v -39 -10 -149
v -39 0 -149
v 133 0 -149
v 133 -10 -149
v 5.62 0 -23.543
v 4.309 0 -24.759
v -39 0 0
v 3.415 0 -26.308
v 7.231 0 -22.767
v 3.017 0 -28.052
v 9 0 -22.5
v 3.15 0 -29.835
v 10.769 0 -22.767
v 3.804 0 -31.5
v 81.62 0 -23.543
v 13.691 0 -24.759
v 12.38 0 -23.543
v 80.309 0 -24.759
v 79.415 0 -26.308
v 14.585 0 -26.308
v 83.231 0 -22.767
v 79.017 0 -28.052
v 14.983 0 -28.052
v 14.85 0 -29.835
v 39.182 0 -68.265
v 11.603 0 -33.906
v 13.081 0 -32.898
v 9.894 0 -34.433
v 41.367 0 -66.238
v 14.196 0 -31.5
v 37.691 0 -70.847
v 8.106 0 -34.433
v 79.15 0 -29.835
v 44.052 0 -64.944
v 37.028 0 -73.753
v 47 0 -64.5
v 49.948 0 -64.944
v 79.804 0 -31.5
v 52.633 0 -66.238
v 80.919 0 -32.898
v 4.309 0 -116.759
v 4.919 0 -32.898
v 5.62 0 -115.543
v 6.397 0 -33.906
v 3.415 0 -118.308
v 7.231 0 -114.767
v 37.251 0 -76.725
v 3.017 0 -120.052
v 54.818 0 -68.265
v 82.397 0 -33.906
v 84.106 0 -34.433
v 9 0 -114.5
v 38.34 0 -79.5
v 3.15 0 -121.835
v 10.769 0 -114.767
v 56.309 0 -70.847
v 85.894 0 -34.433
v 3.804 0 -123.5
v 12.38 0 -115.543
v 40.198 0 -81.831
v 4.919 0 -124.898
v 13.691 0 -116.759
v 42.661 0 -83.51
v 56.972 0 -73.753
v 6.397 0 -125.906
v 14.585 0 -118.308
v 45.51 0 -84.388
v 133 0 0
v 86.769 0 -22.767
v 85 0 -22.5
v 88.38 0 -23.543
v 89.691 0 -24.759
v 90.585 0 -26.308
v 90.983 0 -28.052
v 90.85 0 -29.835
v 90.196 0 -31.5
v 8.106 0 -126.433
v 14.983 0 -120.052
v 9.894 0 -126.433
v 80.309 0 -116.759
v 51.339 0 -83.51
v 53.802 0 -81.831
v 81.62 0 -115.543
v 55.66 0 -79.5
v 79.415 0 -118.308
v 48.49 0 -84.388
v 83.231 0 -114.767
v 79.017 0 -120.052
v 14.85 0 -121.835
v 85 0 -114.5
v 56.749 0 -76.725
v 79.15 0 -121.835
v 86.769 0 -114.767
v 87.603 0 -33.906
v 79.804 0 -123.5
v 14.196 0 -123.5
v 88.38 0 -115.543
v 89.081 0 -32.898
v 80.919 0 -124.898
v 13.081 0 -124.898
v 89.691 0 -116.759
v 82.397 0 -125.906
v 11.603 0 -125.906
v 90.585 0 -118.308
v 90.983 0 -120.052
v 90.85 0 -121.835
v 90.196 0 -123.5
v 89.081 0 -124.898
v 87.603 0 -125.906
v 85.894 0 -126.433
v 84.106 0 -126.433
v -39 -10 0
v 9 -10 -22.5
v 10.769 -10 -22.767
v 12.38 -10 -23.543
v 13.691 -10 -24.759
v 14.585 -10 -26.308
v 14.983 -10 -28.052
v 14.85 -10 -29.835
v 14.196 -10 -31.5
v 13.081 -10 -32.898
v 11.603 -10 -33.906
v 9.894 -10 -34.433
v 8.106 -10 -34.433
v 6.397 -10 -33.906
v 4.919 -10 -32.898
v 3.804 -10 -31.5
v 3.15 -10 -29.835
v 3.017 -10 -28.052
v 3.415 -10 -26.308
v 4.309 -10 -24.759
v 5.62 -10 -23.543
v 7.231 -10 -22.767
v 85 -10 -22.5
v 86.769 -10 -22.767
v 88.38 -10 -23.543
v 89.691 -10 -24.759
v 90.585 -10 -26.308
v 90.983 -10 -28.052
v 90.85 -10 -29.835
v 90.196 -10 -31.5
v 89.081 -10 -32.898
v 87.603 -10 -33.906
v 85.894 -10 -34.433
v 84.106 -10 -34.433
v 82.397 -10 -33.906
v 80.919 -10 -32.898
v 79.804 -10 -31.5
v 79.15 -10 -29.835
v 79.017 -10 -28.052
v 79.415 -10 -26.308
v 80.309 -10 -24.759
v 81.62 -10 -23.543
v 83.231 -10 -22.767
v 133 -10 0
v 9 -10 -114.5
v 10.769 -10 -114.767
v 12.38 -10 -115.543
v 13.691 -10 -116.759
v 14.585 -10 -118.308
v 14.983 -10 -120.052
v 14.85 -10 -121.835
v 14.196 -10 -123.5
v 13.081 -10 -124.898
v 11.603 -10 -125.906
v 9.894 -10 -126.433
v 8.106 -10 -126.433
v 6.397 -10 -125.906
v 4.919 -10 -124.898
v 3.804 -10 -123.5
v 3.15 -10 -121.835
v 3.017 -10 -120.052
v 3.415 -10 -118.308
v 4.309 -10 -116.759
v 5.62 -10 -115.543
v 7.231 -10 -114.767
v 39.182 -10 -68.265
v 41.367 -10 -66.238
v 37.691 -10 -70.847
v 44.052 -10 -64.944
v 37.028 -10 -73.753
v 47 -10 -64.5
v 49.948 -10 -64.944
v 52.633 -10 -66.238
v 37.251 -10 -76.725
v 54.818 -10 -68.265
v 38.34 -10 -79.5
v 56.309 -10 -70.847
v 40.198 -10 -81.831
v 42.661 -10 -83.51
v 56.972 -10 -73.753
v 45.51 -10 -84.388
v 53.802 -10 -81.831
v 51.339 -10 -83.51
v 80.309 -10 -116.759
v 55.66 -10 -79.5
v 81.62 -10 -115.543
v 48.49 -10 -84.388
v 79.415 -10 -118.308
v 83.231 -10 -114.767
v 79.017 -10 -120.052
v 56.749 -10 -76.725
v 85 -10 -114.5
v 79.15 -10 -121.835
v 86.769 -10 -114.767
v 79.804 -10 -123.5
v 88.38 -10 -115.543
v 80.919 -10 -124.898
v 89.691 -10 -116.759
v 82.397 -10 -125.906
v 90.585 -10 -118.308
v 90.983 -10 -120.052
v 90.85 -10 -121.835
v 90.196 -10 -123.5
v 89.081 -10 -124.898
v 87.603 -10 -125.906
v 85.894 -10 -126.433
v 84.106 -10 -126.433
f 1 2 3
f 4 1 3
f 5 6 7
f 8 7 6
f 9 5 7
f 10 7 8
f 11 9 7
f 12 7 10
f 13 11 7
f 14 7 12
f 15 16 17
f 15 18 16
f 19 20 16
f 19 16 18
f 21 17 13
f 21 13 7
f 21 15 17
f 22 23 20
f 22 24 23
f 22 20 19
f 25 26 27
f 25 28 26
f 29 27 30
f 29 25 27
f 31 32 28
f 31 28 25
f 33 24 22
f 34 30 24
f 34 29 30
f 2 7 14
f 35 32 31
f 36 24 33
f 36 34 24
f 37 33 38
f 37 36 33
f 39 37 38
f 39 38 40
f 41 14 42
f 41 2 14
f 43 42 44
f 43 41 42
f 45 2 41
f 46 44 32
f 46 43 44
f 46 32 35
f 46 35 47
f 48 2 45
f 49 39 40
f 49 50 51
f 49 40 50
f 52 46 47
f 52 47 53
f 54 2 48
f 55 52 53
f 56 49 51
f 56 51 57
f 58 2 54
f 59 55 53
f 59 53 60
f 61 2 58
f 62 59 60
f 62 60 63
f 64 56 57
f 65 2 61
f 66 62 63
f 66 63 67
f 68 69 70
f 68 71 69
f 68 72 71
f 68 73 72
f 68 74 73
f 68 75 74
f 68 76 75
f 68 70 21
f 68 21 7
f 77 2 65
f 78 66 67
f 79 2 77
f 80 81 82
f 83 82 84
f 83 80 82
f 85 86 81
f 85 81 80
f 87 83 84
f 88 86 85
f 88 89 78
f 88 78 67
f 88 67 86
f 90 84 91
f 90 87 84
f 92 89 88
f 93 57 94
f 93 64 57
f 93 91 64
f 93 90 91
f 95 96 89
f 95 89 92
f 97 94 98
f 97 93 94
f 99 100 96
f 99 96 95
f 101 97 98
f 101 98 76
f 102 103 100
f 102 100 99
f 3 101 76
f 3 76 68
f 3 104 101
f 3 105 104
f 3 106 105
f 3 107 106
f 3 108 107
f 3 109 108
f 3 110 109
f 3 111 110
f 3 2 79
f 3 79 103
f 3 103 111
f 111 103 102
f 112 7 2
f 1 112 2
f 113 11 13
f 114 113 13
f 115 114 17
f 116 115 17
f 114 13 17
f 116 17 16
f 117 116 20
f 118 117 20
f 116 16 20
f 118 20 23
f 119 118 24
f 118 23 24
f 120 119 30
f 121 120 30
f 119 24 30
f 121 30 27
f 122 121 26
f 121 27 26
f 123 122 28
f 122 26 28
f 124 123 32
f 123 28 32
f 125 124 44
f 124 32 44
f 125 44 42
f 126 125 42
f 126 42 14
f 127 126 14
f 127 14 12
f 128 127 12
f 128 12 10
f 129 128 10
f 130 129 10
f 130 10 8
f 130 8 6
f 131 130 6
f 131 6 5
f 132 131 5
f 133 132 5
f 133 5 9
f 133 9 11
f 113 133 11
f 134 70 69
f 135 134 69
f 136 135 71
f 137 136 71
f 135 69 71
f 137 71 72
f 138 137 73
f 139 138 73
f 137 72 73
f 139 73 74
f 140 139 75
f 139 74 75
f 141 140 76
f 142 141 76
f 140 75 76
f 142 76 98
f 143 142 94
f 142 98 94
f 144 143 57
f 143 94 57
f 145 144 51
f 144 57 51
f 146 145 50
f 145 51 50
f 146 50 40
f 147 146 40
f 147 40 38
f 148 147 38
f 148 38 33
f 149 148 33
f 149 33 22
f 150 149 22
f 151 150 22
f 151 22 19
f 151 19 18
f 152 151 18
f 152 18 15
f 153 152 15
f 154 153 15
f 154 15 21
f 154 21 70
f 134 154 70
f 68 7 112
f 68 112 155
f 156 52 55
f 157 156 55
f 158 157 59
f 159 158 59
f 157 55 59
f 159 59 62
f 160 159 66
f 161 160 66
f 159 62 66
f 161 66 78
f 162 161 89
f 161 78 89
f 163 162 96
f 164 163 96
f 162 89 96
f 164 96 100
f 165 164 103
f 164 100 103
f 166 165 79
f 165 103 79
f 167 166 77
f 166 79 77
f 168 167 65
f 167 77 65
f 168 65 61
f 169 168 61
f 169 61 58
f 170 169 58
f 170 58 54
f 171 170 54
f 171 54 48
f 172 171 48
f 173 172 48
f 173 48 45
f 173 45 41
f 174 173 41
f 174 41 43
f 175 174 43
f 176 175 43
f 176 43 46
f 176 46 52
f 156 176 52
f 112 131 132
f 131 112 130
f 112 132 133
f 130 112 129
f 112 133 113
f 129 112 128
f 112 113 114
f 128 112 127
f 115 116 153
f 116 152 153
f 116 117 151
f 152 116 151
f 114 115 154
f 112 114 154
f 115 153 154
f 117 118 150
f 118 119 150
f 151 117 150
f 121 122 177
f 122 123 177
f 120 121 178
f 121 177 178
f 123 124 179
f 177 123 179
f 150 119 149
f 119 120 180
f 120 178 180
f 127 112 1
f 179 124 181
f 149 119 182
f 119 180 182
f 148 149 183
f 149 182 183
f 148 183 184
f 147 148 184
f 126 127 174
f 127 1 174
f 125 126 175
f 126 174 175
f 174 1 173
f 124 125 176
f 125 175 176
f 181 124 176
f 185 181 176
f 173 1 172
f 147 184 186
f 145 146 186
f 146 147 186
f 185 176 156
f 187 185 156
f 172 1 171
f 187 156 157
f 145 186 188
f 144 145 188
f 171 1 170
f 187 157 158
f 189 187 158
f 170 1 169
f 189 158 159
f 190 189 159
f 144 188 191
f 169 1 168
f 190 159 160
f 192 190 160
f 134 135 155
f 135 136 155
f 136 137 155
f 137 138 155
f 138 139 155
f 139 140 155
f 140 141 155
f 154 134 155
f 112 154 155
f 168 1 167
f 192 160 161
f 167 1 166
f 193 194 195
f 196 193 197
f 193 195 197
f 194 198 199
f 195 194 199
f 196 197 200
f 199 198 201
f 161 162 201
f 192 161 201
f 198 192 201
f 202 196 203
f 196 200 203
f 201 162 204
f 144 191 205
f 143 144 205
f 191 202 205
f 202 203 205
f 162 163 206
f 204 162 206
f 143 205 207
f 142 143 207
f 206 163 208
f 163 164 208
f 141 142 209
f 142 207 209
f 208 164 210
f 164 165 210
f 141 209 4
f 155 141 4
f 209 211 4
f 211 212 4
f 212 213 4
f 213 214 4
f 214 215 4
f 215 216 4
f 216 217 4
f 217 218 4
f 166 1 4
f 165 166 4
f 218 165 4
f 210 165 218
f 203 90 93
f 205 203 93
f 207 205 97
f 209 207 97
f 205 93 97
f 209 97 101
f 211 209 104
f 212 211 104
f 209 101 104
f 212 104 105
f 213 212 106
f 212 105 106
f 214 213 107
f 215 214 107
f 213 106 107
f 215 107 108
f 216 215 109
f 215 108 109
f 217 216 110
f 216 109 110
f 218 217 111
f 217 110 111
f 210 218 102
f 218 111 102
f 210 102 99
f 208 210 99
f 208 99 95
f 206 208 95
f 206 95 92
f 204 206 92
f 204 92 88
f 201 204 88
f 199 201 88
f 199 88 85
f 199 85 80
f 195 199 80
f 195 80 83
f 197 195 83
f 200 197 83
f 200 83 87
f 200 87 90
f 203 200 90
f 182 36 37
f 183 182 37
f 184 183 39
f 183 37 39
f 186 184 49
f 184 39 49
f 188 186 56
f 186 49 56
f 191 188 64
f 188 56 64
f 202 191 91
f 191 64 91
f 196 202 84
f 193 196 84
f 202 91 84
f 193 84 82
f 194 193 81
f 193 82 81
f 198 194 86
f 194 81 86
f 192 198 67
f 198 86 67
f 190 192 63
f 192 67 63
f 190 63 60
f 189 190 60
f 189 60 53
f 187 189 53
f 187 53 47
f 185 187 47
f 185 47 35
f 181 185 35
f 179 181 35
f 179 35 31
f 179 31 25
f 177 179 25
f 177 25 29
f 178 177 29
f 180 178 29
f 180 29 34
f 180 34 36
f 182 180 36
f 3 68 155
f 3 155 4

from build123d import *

# Parameters (mm, degrees)
SKETCH7_W          = 172
SKETCH7_H          = 149
BASE_FLANGE2_DEPTH = 10
SKETCH8_R          = 6
SKETCH8_R_2        = 10
CUT_EXTRUDE1_DEPTH = 200.974998437


# Sheet-metal steps are written as plain solids
with BuildPart() as part:
    # Sketch7 → Base-Flange2 (new body)
    with BuildSketch(Plane(origin=(0, 0, 0), x_dir=(1, 0, 0), z_dir=(0, 1, 0))):
        with Locations((47, 74.5)):
            Rectangle(SKETCH7_W, SKETCH7_H)
    extrude(amount=-BASE_FLANGE2_DEPTH)

    # Sketch8 → Cut-Extrude1 (cut, through all)
    with BuildSketch(Plane(origin=(0, 0, 0), x_dir=(1, 0, 0), z_dir=(0, 1, 0))):
        with Locations(Location((9, 120.5, 0), (0, 0, 270))):
            Circle(SKETCH8_R)
        with Locations(Location((85, 120.5, 0), (0, 0, 270))):
            Circle(SKETCH8_R)
        with Locations(Location((9, 28.5, 0), (0, 0, 270))):
            Circle(SKETCH8_R)
        with Locations(Location((47, 74.5, 0), (0, 0, 270))):
            Circle(SKETCH8_R_2)
        with Locations(Location((85, 28.5, 0), (0, 0, 270))):
            Circle(SKETCH8_R)
    extrude(amount=-CUT_EXTRUDE1_DEPTH, mode=Mode.SUBTRACT)


solid = part.part
